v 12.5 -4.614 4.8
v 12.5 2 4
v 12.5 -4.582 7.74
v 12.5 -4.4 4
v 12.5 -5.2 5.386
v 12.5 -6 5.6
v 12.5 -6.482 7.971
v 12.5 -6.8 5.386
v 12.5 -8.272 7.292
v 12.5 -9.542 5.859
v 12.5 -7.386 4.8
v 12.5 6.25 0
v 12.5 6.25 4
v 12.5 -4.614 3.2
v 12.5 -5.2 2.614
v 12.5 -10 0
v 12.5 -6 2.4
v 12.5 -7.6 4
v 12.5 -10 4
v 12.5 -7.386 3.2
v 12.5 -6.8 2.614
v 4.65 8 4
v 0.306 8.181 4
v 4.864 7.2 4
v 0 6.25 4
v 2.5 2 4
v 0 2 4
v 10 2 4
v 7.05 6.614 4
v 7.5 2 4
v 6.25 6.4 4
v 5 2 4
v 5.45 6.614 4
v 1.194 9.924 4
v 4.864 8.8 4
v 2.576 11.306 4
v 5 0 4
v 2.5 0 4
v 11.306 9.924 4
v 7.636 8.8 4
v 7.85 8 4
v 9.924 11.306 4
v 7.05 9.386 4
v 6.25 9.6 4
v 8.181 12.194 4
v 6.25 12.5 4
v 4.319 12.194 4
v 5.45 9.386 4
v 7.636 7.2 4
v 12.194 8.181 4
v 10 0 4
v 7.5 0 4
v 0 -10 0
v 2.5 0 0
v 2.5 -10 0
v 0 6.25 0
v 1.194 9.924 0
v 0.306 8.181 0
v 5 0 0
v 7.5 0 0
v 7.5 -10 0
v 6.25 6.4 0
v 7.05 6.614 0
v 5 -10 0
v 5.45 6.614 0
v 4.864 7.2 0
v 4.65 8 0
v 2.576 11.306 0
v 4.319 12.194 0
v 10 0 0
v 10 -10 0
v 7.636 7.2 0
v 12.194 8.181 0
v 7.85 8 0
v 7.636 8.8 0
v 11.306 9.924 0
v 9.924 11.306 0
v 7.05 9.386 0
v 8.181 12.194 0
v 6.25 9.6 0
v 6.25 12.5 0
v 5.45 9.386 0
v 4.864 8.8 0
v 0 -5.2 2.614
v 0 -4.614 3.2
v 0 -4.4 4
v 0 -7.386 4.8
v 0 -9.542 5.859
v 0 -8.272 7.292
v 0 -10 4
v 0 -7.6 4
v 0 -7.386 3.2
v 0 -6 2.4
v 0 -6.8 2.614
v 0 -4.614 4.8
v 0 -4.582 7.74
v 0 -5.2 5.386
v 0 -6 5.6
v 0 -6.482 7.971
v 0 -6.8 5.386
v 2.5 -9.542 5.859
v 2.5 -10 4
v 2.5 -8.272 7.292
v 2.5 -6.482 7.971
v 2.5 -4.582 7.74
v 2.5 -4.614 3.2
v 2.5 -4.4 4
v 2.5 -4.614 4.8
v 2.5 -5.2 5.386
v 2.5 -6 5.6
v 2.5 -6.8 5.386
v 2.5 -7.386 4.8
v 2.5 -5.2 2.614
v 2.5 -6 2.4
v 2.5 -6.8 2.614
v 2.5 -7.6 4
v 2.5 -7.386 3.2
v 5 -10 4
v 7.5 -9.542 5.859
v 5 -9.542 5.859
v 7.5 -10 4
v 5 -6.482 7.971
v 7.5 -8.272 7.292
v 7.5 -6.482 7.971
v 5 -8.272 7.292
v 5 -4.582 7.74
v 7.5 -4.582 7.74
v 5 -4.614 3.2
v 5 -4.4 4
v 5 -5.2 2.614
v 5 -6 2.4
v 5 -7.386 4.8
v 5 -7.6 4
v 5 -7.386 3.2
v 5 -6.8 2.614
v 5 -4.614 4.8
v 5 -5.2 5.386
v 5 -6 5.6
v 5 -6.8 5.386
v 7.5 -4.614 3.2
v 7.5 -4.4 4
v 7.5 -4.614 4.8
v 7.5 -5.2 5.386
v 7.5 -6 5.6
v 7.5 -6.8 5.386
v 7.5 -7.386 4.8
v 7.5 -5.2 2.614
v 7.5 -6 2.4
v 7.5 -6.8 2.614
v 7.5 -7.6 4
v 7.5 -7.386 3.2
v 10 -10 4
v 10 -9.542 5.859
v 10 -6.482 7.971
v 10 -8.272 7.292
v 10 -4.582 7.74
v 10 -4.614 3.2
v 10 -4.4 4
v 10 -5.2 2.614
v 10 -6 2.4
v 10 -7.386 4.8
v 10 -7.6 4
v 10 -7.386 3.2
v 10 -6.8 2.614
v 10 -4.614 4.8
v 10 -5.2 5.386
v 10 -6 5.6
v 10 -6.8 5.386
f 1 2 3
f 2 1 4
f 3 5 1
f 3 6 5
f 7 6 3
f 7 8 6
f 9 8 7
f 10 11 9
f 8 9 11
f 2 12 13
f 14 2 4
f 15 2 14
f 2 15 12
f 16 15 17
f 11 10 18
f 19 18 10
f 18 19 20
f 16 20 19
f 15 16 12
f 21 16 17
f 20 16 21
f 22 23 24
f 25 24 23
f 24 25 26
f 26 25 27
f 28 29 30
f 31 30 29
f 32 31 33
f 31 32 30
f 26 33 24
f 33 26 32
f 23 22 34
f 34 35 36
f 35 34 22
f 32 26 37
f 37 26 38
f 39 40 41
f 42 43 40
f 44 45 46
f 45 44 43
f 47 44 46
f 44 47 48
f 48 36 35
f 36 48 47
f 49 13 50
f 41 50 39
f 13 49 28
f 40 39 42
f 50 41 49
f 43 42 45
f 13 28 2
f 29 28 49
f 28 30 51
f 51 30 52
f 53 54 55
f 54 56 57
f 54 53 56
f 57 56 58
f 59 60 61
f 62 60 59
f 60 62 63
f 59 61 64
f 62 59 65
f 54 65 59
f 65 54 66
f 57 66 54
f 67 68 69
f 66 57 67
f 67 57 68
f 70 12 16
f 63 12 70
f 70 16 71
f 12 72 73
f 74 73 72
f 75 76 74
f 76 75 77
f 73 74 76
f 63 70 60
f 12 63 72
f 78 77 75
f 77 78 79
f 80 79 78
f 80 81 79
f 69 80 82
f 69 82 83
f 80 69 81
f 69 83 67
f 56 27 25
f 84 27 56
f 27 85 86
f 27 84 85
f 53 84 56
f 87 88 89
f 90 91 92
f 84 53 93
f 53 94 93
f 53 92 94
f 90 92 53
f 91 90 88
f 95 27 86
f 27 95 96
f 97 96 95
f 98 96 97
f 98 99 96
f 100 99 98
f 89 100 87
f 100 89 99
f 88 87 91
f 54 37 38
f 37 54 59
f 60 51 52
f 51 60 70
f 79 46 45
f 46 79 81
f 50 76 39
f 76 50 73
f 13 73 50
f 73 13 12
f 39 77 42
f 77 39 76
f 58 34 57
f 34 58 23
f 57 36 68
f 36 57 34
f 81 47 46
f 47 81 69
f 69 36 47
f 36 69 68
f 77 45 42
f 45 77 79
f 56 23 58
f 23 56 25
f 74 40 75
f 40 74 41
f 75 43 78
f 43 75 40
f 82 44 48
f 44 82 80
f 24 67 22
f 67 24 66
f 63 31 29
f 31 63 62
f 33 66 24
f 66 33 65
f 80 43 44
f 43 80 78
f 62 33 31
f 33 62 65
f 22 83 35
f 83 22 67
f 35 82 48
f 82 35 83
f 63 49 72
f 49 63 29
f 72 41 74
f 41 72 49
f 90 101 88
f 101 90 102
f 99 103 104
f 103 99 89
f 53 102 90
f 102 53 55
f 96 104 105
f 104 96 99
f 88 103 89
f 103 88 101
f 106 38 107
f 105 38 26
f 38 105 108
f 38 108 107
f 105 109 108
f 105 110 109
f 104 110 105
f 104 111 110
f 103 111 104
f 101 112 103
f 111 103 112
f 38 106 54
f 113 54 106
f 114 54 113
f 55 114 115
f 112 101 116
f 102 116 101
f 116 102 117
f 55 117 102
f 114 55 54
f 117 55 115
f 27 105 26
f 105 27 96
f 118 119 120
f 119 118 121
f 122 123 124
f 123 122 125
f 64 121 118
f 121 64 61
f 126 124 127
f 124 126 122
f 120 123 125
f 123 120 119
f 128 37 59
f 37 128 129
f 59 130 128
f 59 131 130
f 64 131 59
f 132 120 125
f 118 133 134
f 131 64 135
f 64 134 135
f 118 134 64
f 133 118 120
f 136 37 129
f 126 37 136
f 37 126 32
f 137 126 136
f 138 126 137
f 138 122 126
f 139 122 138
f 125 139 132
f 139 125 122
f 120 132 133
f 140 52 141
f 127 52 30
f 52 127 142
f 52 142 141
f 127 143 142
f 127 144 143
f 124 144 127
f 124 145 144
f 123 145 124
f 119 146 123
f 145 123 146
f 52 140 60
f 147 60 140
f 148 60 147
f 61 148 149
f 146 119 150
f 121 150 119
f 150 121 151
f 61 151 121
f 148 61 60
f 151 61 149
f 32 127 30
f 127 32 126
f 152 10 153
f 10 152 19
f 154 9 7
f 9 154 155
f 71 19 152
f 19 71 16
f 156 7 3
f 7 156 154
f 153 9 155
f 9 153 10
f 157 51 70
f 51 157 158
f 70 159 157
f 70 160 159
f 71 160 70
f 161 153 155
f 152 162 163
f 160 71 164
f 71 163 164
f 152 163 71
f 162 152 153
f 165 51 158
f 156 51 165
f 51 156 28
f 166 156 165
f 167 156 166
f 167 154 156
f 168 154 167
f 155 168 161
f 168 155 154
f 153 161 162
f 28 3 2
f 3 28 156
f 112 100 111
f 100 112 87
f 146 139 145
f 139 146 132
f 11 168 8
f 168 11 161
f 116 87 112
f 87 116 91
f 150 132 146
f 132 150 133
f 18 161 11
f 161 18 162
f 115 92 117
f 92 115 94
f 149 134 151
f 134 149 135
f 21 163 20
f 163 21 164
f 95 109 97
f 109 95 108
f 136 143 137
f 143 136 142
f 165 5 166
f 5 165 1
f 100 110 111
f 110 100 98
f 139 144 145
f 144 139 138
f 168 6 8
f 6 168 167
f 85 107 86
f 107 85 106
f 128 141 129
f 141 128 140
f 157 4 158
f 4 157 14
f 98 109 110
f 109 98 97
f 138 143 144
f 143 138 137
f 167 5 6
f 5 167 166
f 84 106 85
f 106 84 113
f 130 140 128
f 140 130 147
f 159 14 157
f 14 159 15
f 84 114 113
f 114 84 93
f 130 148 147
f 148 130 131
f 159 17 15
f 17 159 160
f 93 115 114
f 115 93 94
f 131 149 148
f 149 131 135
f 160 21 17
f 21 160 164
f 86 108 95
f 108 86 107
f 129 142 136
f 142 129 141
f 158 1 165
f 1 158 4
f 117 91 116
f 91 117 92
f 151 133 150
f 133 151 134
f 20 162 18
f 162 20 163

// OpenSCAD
difference() {
	union() {
		cube([12.5, 12.5/2, 4]);
		translate([12.5/2, 12.5/2, 0]) cylinder(h=4, d=12.5);
	}
	translate([12.5/2, 8, -0.5]) cylinder(h=5, r=1.6, $fn = 12);
}
rotate([0, 0, -90]) Fingers();

module Fingers() {
difference() {
	union() {
	Finger();
	translate([0, 5]) Finger();
	translate([0, 10]) Finger();
}
		translate([6, 6, 4]) rotate([90, 0, 0]) cylinder(r=1.6, h=14, $fn=12, center=true);

}
}

module Finger() {
		hull() {	
			union() {
				translate([6, 2.5, 4]) rotate([90, 0, 0]) cylinder(h=2.5, d=8);
				translate([6, 0, 0]) cube([4, 2.5, 4]);
			}
			translate([-2,0, 0]) cube([2, 2.5, 4]);
		}
}
